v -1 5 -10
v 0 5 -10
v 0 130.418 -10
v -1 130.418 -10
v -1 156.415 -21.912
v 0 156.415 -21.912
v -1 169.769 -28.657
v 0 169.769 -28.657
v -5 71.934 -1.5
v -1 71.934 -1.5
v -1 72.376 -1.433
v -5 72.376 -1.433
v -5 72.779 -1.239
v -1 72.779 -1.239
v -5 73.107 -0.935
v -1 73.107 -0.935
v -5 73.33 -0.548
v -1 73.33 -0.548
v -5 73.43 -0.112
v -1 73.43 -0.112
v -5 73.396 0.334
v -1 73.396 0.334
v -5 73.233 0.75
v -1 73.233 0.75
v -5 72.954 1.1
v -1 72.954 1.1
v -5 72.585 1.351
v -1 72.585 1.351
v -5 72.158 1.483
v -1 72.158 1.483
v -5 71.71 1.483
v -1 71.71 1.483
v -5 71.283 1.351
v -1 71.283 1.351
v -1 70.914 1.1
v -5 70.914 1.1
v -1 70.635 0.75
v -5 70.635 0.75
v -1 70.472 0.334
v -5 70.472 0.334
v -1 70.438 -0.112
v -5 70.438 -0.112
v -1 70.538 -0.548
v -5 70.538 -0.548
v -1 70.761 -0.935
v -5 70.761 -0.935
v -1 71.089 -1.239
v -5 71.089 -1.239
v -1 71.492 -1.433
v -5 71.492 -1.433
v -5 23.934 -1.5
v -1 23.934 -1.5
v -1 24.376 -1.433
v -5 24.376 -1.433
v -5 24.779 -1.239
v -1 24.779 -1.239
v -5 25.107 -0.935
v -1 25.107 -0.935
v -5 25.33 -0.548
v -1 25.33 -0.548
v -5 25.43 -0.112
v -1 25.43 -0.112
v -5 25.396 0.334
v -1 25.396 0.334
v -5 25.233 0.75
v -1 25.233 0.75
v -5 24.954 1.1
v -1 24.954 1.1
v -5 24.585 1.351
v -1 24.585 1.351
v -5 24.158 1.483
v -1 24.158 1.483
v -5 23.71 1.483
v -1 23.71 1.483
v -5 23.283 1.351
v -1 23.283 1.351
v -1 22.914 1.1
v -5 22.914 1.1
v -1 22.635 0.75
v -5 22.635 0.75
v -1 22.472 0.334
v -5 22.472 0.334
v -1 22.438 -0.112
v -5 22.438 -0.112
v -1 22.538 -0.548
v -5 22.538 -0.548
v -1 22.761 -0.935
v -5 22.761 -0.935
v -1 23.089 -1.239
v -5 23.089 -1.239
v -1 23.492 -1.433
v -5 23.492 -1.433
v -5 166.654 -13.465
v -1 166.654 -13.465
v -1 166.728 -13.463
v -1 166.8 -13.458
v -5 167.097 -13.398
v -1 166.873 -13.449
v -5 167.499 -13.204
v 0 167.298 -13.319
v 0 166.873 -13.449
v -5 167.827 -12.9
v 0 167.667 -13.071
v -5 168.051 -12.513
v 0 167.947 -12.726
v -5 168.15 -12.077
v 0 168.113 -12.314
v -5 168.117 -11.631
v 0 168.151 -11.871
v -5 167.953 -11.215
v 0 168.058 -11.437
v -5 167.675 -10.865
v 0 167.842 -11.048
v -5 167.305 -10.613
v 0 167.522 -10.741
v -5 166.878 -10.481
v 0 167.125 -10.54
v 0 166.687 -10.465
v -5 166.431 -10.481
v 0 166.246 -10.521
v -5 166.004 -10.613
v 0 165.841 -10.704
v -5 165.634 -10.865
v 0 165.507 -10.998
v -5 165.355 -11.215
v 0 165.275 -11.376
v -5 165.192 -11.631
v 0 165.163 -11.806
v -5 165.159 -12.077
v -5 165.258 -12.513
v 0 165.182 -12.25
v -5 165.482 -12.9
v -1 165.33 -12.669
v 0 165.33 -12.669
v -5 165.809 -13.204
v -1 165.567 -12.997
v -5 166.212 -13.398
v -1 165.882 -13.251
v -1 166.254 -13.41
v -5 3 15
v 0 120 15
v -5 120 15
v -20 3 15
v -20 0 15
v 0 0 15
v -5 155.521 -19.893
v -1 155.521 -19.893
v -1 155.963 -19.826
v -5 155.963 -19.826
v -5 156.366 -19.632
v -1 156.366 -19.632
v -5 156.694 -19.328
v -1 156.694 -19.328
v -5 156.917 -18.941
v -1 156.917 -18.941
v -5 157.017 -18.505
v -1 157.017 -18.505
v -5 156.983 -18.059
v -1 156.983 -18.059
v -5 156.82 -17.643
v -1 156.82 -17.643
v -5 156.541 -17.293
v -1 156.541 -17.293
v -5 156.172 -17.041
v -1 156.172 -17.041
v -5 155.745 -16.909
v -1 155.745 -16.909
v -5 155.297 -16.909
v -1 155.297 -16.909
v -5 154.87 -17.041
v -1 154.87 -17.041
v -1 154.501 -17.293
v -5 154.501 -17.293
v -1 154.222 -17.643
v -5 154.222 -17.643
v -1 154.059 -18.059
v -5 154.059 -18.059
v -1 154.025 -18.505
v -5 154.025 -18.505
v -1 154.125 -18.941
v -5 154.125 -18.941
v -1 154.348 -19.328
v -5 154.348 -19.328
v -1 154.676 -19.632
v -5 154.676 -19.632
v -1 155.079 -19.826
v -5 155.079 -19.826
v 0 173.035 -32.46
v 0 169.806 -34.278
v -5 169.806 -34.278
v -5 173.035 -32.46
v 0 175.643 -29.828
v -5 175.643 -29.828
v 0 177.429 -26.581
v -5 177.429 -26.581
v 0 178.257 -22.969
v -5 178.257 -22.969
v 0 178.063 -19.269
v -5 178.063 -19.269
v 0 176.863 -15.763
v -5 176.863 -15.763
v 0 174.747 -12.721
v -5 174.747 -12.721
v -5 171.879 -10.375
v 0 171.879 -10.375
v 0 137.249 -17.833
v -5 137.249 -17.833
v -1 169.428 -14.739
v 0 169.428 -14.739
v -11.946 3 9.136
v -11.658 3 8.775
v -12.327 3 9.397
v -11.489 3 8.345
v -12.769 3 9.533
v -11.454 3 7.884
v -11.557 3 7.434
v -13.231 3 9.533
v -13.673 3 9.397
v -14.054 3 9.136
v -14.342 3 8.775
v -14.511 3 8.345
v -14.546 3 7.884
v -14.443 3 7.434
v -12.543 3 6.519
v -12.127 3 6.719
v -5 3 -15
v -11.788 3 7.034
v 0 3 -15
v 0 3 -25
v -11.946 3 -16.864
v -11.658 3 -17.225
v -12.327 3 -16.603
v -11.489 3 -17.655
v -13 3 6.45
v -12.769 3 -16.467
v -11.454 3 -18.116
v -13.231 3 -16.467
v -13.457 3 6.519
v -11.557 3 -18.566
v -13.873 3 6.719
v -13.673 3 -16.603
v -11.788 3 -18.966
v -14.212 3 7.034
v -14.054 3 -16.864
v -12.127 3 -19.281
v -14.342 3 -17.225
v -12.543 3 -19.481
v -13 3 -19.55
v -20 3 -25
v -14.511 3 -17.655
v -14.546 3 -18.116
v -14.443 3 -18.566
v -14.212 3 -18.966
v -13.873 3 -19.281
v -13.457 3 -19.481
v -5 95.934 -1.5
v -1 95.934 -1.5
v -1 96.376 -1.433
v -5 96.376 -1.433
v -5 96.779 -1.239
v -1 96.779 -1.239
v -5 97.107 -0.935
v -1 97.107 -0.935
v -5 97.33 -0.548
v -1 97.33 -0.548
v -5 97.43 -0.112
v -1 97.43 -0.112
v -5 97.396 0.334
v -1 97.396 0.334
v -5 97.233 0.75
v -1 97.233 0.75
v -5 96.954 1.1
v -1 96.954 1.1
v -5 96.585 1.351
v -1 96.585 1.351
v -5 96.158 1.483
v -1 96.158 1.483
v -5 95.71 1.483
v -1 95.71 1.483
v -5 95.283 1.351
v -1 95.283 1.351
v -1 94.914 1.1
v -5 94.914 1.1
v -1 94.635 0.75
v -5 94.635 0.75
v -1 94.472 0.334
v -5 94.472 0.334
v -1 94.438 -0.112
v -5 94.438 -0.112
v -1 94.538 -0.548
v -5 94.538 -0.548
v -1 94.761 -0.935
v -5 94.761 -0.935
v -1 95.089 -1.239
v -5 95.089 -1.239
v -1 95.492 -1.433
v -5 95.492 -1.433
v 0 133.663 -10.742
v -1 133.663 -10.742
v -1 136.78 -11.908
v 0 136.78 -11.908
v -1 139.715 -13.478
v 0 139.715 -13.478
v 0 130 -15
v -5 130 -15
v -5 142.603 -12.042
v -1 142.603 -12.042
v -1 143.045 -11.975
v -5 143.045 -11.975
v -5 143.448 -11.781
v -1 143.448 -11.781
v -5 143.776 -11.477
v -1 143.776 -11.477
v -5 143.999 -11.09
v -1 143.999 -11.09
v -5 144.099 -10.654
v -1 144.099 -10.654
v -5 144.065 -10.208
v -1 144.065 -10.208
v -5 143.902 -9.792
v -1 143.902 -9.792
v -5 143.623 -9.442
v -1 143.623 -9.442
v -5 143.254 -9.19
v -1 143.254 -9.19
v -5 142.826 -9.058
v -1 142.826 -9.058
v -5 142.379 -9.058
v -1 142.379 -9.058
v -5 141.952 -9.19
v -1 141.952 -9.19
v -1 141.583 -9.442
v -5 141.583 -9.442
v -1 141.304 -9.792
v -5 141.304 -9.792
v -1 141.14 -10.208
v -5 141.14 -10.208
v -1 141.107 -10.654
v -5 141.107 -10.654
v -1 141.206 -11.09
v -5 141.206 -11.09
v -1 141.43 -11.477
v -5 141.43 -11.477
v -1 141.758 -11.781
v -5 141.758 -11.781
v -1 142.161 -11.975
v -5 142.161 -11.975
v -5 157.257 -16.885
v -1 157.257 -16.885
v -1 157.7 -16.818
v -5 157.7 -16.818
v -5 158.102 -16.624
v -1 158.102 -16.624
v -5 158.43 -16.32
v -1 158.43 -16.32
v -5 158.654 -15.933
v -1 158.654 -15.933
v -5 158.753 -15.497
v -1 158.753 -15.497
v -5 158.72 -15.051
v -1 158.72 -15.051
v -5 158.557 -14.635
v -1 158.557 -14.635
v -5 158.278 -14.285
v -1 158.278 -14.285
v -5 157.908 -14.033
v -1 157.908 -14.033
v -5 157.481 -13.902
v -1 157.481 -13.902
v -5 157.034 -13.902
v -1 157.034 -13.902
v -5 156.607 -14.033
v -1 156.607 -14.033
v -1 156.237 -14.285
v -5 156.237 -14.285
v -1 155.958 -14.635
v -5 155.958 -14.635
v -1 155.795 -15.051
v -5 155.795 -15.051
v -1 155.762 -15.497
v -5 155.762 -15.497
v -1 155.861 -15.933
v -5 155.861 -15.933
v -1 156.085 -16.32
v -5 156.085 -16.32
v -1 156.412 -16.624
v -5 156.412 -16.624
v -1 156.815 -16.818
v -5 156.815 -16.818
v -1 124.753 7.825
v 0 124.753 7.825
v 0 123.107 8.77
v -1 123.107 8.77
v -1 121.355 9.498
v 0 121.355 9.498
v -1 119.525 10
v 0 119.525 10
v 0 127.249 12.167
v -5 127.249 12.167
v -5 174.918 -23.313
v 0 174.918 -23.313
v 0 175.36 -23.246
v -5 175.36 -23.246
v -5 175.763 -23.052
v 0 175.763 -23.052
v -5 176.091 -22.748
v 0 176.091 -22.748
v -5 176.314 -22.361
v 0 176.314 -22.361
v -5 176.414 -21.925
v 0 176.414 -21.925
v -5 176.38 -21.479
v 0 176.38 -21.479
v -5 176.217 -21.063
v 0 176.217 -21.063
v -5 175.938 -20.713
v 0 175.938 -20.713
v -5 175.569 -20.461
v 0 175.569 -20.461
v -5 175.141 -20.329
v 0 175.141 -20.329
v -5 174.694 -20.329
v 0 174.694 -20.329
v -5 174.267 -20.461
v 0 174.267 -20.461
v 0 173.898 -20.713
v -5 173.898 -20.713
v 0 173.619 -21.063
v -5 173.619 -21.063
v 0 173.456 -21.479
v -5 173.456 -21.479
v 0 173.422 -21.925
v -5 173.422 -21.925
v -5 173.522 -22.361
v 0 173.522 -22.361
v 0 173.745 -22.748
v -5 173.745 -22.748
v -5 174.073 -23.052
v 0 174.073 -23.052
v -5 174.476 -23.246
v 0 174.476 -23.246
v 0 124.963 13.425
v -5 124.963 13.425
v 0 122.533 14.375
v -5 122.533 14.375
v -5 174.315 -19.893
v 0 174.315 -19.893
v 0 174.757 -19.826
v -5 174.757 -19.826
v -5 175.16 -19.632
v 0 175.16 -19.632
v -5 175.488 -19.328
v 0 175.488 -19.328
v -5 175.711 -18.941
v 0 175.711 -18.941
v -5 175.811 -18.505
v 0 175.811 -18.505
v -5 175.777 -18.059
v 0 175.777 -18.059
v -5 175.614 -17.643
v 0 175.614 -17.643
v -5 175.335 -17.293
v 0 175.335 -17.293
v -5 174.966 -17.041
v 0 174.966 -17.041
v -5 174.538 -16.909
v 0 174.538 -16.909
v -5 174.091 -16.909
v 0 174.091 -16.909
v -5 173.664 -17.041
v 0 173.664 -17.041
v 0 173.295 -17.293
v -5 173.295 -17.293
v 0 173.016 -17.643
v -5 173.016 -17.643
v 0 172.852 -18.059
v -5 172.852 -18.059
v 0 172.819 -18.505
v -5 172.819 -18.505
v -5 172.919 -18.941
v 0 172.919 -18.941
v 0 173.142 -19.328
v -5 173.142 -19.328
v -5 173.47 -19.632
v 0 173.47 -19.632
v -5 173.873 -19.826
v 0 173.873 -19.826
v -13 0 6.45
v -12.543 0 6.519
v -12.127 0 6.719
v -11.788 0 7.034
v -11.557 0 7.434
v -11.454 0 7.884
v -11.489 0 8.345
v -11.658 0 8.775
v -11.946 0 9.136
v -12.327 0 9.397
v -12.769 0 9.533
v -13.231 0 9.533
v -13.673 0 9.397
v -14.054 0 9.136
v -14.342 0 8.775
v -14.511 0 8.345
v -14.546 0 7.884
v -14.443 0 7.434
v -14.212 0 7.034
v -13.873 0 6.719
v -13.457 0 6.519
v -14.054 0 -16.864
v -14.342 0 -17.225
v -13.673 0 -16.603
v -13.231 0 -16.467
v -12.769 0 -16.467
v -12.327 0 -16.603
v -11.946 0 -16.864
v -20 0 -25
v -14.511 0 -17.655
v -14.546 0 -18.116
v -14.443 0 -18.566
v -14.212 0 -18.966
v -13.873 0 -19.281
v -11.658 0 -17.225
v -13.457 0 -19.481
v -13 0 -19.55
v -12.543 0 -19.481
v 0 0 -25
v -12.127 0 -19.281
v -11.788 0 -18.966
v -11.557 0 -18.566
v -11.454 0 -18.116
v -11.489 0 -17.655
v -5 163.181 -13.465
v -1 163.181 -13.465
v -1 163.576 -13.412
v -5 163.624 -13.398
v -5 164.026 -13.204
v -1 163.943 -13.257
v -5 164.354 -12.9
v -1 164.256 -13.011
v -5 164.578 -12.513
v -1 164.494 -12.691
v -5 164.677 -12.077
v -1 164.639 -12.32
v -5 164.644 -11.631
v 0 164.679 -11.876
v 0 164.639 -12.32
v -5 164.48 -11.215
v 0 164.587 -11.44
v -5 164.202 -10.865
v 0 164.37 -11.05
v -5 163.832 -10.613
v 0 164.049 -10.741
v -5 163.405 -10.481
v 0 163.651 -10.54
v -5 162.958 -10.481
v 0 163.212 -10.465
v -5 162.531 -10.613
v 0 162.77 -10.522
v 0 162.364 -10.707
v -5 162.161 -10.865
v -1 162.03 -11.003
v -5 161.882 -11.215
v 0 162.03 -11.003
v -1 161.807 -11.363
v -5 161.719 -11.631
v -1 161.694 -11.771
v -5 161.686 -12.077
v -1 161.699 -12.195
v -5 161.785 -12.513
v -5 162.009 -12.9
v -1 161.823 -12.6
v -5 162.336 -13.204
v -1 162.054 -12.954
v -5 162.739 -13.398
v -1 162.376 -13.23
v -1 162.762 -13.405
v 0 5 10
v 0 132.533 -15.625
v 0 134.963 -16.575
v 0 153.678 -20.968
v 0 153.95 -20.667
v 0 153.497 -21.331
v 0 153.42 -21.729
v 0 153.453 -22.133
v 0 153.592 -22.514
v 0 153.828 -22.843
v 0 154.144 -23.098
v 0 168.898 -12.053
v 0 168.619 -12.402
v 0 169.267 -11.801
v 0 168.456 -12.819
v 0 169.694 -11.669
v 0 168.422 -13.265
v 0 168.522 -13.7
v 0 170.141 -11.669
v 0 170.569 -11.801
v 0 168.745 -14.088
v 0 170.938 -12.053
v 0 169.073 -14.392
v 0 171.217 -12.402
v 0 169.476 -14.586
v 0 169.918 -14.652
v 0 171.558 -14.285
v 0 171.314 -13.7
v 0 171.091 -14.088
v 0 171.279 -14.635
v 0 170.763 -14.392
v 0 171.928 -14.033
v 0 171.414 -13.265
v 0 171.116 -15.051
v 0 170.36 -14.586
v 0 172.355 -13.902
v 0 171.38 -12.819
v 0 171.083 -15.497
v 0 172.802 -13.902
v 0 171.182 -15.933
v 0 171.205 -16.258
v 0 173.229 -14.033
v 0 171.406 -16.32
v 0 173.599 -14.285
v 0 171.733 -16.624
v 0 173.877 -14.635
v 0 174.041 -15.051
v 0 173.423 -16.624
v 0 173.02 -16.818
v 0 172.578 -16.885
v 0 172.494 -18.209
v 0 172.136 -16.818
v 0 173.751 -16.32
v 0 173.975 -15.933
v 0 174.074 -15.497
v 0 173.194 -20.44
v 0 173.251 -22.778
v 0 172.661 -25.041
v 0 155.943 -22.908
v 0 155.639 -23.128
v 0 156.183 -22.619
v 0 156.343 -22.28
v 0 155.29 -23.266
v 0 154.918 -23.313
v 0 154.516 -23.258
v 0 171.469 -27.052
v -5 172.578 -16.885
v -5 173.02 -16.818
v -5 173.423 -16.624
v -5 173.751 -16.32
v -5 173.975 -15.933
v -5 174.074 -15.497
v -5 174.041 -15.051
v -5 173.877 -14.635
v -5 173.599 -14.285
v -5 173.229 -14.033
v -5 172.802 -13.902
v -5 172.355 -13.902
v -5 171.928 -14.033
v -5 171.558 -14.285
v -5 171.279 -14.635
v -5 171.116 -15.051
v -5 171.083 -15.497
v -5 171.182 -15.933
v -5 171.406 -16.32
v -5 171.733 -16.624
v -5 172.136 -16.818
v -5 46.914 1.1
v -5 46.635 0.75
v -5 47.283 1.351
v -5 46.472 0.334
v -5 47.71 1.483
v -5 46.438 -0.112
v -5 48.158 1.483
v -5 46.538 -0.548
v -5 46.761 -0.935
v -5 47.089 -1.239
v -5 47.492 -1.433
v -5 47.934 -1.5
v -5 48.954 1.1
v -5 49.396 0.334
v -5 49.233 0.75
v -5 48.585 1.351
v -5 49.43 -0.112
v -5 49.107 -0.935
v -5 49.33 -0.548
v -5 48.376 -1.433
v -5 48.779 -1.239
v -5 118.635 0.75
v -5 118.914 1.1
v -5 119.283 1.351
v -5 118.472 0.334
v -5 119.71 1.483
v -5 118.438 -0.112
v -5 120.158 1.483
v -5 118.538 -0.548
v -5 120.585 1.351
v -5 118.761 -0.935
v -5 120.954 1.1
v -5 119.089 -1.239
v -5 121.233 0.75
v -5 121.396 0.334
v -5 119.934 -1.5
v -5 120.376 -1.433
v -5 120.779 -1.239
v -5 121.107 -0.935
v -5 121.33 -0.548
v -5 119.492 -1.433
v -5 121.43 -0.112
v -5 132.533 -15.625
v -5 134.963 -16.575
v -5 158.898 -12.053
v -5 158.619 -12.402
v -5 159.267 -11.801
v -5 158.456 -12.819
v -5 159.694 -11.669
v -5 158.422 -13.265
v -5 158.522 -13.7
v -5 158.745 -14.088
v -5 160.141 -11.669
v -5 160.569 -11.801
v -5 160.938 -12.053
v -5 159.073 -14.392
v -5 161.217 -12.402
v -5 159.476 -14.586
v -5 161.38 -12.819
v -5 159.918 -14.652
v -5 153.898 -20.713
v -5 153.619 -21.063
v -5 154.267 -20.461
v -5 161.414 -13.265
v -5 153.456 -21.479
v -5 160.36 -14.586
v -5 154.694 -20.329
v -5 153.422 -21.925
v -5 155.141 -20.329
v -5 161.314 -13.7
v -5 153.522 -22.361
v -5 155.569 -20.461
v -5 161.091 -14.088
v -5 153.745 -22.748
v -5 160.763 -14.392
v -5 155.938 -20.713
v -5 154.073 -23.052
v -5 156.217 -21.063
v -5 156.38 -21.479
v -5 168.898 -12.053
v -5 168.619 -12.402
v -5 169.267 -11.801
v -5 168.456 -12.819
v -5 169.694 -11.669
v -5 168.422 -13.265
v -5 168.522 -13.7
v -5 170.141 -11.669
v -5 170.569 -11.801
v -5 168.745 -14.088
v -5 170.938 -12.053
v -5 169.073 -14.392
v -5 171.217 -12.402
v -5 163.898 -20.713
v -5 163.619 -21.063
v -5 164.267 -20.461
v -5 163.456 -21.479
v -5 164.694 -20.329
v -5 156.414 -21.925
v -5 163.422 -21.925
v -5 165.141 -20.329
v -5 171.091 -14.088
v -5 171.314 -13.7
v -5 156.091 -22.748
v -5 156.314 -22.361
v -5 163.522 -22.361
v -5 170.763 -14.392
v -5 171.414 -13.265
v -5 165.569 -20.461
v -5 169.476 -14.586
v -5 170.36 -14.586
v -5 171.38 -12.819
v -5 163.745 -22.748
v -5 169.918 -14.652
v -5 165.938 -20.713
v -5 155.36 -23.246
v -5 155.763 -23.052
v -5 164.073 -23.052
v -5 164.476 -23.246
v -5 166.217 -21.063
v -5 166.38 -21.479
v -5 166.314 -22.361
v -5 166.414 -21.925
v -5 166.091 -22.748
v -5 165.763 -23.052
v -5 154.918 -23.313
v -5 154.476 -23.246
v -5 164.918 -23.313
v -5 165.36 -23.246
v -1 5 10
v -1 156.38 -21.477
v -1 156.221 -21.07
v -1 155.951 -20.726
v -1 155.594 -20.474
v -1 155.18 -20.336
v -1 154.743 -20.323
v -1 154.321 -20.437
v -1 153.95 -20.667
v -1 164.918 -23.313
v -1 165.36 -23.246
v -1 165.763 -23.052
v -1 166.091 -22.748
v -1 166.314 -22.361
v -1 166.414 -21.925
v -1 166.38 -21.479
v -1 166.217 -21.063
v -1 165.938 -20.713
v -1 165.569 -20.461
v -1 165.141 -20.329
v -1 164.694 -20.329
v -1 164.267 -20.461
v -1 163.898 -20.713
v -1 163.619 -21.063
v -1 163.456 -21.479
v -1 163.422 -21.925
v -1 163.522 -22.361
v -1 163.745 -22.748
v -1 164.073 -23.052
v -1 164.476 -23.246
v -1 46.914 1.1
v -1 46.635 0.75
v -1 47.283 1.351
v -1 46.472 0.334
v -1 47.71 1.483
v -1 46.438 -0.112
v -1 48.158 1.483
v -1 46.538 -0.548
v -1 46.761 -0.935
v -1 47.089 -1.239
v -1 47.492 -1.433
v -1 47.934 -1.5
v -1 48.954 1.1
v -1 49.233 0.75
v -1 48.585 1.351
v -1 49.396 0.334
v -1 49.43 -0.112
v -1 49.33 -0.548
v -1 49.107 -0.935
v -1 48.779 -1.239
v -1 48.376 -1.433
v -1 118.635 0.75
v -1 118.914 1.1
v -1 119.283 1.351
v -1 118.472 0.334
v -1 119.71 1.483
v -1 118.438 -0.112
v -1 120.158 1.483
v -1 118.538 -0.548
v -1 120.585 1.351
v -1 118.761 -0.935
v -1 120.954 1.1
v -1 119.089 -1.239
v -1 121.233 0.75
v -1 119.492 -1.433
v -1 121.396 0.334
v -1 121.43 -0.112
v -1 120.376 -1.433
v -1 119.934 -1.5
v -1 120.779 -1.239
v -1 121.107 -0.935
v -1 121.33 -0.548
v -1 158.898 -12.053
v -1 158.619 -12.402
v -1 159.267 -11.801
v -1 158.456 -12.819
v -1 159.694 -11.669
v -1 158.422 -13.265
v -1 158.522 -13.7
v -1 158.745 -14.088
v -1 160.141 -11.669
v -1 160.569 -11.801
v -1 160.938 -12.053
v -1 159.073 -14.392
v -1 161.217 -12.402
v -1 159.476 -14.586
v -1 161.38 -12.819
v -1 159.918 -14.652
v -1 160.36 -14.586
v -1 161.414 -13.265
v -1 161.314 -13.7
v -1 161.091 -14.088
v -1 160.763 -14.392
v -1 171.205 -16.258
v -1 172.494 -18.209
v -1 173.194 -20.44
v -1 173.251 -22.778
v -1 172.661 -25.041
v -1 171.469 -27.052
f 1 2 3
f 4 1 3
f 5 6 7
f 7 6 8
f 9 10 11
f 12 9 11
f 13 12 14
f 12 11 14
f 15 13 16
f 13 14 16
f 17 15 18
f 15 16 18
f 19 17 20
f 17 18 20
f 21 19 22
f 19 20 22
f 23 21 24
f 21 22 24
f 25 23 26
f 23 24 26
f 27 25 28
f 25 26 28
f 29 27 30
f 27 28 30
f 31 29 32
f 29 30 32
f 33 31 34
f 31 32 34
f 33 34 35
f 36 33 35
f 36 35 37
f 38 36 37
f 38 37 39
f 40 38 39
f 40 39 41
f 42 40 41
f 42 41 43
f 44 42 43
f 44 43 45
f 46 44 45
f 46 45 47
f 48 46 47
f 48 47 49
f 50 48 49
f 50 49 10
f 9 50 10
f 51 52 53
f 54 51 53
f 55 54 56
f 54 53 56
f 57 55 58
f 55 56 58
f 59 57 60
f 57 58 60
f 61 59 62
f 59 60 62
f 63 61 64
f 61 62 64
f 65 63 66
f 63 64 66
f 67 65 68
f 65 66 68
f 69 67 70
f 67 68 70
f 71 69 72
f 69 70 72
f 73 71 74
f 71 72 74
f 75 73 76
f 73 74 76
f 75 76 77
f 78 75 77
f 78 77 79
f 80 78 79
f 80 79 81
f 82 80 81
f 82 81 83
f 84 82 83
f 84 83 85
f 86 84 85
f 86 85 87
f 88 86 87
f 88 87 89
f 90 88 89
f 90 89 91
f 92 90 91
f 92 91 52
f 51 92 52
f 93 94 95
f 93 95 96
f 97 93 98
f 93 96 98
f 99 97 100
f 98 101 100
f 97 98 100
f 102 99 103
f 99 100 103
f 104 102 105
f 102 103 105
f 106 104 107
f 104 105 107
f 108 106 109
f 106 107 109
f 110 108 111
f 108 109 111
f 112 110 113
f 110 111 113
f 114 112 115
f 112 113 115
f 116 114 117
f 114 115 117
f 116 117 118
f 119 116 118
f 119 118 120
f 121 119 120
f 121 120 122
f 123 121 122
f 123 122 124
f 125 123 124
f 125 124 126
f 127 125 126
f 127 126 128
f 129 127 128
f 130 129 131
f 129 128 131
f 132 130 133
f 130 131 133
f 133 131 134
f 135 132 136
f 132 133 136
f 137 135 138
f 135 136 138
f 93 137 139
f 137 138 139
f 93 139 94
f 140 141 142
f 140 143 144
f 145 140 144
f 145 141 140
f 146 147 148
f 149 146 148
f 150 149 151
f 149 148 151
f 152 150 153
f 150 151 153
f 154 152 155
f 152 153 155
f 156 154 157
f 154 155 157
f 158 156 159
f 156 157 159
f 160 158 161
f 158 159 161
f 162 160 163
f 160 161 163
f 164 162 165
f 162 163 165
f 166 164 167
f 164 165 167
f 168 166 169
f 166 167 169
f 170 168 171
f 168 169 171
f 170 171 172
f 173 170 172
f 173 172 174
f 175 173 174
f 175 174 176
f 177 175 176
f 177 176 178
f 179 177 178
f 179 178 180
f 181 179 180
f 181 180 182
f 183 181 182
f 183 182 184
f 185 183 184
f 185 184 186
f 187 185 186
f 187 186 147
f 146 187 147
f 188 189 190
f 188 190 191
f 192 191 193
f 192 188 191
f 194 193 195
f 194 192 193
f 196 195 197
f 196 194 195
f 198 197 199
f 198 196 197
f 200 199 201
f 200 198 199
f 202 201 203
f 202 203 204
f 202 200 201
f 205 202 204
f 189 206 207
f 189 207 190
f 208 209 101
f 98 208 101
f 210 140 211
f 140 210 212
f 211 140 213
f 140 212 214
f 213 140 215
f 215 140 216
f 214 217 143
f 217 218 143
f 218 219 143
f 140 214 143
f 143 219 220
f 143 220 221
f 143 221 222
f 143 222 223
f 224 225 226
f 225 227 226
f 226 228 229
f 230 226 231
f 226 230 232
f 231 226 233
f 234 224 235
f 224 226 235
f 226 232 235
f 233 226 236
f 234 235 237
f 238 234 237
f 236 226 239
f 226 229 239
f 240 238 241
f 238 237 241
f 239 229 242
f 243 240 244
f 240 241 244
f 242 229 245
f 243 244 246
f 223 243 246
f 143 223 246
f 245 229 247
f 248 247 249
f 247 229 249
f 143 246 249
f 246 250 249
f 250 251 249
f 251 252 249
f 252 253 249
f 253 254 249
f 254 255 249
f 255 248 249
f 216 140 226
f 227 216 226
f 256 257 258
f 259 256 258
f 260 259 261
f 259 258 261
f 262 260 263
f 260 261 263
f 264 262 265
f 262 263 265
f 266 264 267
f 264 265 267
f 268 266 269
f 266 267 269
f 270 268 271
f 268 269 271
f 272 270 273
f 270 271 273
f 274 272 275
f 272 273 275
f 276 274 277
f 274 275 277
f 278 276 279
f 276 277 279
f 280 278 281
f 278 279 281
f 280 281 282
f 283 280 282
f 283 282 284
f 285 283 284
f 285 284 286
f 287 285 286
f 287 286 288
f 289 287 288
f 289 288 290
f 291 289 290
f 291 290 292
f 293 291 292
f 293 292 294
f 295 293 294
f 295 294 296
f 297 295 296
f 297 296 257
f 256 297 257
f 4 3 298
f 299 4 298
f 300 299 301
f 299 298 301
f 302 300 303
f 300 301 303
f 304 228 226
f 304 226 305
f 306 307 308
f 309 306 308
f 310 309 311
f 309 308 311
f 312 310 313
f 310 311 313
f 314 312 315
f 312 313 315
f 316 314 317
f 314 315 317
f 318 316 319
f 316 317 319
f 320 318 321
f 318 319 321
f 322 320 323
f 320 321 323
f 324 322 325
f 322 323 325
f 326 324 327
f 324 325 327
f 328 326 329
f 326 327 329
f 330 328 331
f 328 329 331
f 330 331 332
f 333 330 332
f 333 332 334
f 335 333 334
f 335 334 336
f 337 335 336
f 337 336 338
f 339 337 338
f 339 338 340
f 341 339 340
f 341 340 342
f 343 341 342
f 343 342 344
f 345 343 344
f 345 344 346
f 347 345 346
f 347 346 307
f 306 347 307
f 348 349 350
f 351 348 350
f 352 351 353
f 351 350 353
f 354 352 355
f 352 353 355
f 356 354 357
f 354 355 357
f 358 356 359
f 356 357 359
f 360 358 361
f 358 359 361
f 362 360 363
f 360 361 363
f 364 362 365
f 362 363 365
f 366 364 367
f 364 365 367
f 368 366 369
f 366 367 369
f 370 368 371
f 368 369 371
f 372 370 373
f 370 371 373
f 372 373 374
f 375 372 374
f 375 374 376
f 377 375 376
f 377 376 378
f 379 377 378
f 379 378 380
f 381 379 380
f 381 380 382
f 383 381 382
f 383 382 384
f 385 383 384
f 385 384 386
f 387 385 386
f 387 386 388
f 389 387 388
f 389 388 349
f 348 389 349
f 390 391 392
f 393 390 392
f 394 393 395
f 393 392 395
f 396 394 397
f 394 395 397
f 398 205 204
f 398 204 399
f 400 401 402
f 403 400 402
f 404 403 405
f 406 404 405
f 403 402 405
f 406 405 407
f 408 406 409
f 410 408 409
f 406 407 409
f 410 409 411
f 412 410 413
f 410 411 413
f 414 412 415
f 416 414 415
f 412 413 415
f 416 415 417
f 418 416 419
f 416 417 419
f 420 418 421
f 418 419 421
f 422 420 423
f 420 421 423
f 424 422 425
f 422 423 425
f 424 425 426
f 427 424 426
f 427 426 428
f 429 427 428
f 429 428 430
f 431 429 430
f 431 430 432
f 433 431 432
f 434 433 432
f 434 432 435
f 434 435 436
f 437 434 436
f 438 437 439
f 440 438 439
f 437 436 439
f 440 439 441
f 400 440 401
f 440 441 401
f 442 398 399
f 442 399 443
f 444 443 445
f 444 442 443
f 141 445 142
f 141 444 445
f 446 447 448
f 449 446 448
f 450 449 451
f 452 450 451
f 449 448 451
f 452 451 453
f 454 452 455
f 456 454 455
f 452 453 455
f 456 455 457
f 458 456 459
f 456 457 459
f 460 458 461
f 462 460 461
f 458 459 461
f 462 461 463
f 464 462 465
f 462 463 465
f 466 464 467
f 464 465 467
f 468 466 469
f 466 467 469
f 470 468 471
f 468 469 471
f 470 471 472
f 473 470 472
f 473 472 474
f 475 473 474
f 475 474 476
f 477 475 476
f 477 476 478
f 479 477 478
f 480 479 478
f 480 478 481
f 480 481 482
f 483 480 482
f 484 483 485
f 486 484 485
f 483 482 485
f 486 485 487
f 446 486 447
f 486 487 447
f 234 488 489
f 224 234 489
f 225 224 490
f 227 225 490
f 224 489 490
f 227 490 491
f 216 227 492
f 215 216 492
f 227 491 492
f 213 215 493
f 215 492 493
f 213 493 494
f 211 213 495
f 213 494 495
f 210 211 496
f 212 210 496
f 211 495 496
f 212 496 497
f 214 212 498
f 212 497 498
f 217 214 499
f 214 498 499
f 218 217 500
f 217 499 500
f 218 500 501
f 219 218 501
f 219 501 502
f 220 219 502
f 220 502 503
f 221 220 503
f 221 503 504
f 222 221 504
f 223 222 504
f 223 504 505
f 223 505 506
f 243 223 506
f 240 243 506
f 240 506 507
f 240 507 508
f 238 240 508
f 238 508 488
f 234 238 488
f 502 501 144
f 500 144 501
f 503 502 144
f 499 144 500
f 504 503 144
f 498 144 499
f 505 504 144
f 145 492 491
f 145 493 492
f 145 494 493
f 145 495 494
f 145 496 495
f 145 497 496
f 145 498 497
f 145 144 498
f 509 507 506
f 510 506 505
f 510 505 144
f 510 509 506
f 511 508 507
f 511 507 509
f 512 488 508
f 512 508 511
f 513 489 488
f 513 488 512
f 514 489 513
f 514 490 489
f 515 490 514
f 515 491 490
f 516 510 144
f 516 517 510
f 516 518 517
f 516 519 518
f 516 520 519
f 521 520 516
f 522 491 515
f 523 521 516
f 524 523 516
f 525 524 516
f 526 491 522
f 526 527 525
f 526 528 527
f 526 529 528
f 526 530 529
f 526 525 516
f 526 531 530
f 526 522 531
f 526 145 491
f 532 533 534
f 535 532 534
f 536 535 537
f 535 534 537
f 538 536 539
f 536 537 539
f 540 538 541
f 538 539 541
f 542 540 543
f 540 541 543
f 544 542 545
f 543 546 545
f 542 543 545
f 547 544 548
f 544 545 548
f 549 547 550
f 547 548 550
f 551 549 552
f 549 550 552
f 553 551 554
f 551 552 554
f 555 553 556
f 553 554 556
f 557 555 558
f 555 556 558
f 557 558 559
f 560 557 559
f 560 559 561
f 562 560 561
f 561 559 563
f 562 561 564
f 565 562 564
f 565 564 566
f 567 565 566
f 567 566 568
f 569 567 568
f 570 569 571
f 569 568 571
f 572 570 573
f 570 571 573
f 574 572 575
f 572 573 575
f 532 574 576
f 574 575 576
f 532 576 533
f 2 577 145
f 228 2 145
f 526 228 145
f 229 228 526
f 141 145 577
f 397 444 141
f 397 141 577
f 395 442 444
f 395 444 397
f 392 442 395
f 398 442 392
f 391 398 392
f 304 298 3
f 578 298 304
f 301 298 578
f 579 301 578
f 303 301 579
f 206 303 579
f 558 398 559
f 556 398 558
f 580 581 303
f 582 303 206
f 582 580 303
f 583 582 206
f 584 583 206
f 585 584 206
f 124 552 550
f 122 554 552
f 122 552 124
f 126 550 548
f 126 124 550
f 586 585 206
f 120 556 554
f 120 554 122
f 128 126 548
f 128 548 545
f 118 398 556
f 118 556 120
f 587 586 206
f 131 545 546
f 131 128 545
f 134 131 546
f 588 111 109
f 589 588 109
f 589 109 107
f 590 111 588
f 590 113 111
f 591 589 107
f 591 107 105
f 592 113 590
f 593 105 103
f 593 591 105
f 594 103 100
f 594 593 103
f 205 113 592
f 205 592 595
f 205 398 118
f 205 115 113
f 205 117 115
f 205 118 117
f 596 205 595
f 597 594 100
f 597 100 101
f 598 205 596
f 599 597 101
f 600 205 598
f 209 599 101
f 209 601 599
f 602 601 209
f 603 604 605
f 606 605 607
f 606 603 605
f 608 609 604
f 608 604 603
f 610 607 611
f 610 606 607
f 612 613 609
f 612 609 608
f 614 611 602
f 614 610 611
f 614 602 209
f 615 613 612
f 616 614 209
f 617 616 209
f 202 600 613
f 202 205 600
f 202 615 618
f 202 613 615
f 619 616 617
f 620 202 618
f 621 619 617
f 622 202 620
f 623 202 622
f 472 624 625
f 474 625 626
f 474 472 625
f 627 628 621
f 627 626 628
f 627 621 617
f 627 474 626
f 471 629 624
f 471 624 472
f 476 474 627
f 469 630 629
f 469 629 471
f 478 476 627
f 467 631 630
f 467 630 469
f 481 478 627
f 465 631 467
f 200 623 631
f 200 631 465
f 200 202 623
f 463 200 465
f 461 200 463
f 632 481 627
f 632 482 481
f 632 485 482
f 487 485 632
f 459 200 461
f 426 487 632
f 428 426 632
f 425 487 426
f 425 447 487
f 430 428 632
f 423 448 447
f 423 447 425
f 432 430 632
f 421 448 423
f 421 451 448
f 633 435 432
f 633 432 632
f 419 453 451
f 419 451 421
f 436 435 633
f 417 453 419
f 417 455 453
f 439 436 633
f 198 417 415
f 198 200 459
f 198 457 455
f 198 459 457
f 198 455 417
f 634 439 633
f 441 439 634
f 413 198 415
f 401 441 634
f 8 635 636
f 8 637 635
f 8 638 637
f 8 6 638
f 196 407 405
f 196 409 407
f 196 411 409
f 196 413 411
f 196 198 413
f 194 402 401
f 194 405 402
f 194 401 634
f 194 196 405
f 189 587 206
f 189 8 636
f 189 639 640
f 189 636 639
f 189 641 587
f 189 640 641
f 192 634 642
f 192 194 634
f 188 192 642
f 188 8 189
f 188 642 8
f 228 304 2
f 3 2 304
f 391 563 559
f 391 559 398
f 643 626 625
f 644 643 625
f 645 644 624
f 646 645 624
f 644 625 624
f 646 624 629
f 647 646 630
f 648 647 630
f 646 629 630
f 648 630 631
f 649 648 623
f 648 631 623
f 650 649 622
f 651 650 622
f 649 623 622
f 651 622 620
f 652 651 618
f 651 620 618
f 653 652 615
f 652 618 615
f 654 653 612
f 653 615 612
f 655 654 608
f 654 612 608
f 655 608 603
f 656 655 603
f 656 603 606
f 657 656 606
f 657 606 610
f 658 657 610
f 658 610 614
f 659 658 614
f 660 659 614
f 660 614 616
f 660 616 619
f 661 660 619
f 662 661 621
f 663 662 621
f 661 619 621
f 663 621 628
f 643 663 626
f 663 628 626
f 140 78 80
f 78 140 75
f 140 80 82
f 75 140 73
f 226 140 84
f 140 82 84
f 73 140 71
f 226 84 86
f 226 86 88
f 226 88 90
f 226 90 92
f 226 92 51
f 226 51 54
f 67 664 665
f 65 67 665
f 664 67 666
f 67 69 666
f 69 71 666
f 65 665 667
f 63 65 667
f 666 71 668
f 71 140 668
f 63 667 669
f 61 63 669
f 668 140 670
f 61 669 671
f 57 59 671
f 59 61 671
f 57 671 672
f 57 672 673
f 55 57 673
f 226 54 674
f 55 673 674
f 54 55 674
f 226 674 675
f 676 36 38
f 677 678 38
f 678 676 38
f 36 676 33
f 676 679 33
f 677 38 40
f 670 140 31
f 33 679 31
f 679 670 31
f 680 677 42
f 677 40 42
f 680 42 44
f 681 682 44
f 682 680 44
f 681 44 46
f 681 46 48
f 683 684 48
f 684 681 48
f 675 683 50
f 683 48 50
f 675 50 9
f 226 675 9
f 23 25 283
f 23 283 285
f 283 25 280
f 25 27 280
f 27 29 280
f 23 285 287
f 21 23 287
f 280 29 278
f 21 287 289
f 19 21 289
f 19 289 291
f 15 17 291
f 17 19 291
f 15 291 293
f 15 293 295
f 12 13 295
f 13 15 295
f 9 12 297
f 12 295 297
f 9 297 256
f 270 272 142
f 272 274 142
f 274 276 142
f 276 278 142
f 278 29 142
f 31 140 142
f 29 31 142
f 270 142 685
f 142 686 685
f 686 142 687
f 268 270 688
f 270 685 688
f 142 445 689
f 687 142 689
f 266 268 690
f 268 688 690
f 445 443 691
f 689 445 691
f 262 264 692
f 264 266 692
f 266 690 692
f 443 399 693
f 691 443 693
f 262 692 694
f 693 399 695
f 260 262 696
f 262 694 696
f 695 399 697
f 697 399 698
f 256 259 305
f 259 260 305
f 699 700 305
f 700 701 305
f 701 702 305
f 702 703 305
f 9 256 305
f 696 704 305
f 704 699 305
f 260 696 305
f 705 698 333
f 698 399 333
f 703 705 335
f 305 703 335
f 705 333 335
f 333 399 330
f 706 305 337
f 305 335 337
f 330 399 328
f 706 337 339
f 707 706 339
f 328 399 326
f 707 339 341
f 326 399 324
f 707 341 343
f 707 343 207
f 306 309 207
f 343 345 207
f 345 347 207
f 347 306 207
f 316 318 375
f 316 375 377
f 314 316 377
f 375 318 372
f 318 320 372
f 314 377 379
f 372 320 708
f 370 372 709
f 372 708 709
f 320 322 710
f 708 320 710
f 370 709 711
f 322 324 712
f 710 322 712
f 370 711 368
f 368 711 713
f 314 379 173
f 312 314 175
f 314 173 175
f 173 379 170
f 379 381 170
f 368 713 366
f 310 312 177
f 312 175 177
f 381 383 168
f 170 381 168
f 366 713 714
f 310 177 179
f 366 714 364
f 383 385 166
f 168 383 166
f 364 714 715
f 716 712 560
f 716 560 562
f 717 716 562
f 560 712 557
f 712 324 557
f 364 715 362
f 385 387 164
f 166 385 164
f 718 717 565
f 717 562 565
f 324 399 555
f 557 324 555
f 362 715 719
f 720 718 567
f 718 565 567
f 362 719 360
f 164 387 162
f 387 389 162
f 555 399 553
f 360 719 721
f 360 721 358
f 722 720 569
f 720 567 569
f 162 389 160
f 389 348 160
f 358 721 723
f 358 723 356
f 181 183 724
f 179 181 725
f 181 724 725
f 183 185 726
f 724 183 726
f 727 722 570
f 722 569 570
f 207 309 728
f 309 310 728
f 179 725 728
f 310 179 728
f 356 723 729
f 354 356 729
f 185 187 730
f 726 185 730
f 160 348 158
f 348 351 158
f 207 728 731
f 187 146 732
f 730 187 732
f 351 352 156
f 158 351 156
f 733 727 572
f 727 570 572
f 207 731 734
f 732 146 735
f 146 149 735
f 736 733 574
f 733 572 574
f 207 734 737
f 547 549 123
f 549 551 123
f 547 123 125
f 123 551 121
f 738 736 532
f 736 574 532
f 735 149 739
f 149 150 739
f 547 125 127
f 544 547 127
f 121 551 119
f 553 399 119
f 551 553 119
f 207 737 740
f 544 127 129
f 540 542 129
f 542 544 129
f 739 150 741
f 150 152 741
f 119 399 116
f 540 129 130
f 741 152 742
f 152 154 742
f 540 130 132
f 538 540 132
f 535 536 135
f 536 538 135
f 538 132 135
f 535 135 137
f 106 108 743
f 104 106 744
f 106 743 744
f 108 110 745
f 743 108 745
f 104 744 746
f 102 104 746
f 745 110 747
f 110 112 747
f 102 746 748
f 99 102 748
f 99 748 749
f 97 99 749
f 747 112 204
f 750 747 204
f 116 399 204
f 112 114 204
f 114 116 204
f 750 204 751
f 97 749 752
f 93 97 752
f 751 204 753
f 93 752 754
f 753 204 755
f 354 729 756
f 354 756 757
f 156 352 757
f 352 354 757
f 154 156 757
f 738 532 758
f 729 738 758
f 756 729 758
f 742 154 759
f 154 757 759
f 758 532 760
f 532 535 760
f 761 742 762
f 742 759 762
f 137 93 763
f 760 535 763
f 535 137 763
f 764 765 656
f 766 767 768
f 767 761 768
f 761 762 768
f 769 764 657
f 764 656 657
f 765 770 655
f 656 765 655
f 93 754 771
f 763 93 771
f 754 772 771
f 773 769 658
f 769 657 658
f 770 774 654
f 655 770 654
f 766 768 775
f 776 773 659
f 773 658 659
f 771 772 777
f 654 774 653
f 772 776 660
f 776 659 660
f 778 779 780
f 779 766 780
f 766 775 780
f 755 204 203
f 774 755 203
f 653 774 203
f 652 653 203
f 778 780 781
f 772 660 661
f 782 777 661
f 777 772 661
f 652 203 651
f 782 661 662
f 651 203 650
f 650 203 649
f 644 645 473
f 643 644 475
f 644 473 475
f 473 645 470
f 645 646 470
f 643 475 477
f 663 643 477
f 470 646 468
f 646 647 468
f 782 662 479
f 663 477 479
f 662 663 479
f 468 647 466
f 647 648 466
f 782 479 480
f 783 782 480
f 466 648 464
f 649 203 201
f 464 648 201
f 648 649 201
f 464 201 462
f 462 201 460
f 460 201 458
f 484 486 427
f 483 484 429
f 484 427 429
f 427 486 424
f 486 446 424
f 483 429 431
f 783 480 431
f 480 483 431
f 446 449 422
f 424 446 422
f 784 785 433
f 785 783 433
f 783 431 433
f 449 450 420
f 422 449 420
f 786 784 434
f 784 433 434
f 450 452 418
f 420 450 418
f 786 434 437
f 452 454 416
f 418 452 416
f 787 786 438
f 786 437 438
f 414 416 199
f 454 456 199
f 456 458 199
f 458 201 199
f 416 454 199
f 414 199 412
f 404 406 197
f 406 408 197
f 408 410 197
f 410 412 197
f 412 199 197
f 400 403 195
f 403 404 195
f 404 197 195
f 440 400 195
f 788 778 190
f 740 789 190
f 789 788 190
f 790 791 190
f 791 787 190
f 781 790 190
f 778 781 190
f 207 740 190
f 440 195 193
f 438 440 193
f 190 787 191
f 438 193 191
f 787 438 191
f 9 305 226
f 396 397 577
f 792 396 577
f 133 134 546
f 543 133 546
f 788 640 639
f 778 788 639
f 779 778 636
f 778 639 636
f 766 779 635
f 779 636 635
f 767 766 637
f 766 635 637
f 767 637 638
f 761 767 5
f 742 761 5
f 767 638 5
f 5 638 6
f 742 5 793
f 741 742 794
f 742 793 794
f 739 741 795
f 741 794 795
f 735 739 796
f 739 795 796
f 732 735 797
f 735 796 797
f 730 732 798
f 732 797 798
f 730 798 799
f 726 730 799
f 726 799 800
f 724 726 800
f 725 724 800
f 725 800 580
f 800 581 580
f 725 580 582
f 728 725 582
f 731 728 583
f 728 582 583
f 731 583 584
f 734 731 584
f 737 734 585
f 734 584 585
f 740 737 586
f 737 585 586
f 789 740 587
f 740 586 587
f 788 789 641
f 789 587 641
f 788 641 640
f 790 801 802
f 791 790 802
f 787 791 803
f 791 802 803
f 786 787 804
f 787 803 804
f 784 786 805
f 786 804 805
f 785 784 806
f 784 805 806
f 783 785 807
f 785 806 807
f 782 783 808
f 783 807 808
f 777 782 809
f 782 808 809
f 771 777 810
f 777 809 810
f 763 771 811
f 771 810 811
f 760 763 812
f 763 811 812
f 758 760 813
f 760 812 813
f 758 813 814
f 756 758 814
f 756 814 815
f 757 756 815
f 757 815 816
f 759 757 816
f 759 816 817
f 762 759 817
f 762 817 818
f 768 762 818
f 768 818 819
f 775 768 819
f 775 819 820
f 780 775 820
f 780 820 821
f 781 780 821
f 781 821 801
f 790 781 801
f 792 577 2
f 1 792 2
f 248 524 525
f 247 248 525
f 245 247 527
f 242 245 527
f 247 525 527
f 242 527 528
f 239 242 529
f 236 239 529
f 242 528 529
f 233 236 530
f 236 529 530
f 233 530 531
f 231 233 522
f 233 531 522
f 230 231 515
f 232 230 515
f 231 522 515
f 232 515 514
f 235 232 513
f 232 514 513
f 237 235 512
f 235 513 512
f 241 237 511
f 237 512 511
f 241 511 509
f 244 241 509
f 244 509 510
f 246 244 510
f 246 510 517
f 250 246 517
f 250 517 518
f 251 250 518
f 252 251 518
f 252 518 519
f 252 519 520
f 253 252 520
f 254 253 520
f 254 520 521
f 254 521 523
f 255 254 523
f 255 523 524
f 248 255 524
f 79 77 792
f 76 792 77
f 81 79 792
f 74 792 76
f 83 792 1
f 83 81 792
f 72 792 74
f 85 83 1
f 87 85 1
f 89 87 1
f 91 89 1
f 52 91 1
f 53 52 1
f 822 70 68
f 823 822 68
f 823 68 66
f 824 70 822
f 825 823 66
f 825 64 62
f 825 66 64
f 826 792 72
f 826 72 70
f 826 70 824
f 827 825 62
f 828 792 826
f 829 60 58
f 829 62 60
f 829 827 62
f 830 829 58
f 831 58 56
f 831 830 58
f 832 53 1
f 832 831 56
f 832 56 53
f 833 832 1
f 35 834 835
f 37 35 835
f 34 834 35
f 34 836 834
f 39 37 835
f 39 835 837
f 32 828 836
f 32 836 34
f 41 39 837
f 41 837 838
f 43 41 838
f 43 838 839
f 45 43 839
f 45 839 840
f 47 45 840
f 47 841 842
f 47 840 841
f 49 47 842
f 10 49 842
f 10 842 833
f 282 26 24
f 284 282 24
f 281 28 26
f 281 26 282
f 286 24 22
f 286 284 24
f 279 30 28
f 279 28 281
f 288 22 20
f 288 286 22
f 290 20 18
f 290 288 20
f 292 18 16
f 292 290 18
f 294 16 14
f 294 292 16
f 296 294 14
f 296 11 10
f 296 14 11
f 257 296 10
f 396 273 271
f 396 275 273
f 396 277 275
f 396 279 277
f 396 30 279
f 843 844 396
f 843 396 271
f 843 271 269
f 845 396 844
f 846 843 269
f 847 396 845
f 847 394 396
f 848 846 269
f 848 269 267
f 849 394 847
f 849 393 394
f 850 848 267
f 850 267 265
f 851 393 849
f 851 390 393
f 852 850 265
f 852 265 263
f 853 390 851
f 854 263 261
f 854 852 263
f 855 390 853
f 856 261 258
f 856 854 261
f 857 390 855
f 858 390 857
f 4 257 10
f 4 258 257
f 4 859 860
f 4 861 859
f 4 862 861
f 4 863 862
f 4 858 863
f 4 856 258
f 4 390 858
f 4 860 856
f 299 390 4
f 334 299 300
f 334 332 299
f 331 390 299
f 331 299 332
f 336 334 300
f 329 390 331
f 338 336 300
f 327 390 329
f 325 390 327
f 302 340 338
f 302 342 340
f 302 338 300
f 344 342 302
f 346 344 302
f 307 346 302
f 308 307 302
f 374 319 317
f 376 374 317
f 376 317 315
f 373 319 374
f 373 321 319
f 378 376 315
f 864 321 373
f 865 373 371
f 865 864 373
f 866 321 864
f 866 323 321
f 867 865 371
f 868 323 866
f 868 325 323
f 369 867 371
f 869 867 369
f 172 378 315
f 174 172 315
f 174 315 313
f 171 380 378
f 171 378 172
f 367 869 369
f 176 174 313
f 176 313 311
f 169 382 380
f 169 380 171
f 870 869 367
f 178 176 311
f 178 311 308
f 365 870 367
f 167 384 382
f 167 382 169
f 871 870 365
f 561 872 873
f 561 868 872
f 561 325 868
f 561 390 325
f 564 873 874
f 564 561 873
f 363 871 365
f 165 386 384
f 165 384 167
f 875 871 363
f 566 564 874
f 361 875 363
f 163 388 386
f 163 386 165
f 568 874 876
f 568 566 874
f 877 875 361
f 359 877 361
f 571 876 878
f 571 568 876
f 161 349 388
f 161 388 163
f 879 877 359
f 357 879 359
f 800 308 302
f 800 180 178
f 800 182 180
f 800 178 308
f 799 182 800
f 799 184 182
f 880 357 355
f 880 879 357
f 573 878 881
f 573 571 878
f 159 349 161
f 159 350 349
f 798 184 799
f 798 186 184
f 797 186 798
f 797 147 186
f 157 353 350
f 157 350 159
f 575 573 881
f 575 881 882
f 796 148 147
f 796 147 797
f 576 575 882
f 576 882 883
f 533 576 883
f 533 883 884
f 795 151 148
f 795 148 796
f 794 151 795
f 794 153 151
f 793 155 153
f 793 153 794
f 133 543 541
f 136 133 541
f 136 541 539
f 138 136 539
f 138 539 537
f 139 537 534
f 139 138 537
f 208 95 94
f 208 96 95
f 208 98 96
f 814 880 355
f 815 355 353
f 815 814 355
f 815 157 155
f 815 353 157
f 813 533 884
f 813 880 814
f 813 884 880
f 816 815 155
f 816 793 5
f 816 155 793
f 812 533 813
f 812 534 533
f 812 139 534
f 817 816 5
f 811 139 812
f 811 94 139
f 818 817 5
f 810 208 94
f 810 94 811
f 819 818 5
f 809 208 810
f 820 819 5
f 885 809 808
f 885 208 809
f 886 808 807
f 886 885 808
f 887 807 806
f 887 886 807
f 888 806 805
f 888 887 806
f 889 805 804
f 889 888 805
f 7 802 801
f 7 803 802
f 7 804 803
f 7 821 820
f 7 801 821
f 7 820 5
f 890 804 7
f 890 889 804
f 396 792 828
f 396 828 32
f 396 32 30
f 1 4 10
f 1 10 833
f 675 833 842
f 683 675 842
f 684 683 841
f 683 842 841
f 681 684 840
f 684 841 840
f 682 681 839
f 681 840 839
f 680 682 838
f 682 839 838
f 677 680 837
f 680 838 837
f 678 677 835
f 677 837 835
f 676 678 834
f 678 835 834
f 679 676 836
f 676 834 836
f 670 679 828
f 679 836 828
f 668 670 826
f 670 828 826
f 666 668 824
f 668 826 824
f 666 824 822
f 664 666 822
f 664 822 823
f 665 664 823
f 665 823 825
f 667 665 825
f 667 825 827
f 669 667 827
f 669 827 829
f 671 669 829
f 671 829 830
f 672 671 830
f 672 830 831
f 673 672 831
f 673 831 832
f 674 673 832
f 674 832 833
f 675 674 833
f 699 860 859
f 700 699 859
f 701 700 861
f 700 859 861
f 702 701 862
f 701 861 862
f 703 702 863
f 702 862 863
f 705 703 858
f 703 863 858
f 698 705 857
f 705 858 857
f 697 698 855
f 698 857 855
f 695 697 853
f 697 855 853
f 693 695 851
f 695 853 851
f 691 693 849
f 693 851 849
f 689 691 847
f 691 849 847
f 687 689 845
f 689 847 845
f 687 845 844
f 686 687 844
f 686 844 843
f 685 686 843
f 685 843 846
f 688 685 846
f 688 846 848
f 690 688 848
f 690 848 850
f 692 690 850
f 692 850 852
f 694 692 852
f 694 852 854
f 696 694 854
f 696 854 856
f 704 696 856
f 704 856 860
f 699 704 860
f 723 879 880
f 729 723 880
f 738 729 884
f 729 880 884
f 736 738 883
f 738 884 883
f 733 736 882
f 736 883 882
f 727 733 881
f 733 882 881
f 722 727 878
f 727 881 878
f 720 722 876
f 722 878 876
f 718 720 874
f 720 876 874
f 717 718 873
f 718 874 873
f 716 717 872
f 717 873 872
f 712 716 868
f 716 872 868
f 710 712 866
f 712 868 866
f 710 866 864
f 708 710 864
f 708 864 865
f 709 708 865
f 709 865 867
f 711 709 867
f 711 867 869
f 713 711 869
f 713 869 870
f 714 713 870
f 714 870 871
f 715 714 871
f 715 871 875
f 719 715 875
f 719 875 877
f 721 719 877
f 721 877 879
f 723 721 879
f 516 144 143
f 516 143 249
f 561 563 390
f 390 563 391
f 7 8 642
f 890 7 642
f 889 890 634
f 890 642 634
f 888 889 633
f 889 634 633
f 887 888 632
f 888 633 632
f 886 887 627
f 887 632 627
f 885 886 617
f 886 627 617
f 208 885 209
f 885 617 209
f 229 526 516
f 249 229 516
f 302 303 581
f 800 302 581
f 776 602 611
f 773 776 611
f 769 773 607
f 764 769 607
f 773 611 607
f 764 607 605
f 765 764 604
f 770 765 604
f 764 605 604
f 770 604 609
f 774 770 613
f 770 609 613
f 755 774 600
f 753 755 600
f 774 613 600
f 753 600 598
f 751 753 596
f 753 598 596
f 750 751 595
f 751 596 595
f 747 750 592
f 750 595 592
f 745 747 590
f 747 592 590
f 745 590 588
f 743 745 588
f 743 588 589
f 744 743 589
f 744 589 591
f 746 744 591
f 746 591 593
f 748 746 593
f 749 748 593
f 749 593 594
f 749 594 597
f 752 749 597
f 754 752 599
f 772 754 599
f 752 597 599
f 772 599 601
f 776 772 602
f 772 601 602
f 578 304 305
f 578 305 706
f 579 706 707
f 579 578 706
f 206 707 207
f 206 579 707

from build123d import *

# Parameters (mm, degrees)
SKETCH_1_R          = 1.5
EXTRUDE_2_DEPTH     = 5
CUT_EXTRUDE_1_DEPTH = 1
SKETCH_5_W          = 20
SKETCH_5_H          = 40
EXTRUDE_3_DEPTH     = 3
SKETCH_6_R          = 1.55
CUT_EXTRUDE_2_DEPTH = 10


with BuildPart() as part:
    # 草图1 → 凸台-拉伸2 (new body)
    with BuildSketch(Plane(origin=(0, 0, 0), x_dir=(0, 0, -1), z_dir=(1, 0, 0))):
        with BuildLine():
            Line((-15, 0), (15, 0))
            Line((15, 0), (15, 130))
            ThreePointArc((15, 130), (16.060667235, 133.763397528), (17.833287426, 137.248507798))
            Line((17.833287426, 137.248507798), (34.277601095, 169.80605943))
            ThreePointArc((34.277601095, 169.80605943), (22.969406924, 178.256928012), (10.37531975, 171.878730504))
            Line((10.37531975, 171.878730504), (-12.166712574, 127.248507798))
            ThreePointArc((-12.166712574, 127.248507798), (-13.939332765, 123.763397528), (-15, 120))
            Line((-15, 120), (-15, 0))
        make_face()
        with Locations((0, 23.934052351)):
            Circle(SKETCH_1_R, mode=Mode.SUBTRACT)
        with Locations((0, 47.934052351)):
            Circle(SKETCH_1_R, mode=Mode.SUBTRACT)
        with Locations((0, 71.934052351)):
            Circle(SKETCH_1_R, mode=Mode.SUBTRACT)
        with Locations((0, 95.934052351)):
            Circle(SKETCH_1_R, mode=Mode.SUBTRACT)
        with Locations((10.541707006, 142.602806473)):
            Circle(SKETCH_1_R, mode=Mode.SUBTRACT)
        with Locations((0, 119.934052351)):
            Circle(SKETCH_1_R, mode=Mode.SUBTRACT)
        with Locations((21.812723168, 164.917917825)):
            Circle(SKETCH_1_R, mode=Mode.SUBTRACT)
        with Locations((11.964645637, 166.654399602)):
            Circle(SKETCH_1_R, mode=Mode.SUBTRACT)
        with Locations((11.964645637, 163.181436049)):
            Circle(SKETCH_1_R, mode=Mode.SUBTRACT)
        with Locations((13.15246913, 159.917917825)):
            Circle(SKETCH_1_R, mode=Mode.SUBTRACT)
        with Locations((15.384847071, 157.257473394)):
            Circle(SKETCH_1_R, mode=Mode.SUBTRACT)
        with Locations((18.392521734, 155.520991617)):
            Circle(SKETCH_1_R, mode=Mode.SUBTRACT)
        with Locations((21.812723168, 154.917917825)):
            Circle(SKETCH_1_R, mode=Mode.SUBTRACT)
        with Locations((13.15246913, 169.917917825)):
            Circle(SKETCH_1_R, mode=Mode.SUBTRACT)
        with Locations((15.384847071, 172.578362256)):
            Circle(SKETCH_1_R, mode=Mode.SUBTRACT)
        with Locations((18.392521734, 174.314844033)):
            Circle(SKETCH_1_R, mode=Mode.SUBTRACT)
        with Locations((21.812723168, 174.917917825)):
            Circle(SKETCH_1_R, mode=Mode.SUBTRACT)
    extrude(amount=-EXTRUDE_2_DEPTH)

    # 草图4 → 切除-拉伸1 (cut)
    with BuildSketch(Plane(origin=(0, 0, 0), x_dir=(0, 0, -1), z_dir=(1, 0, 0))):
        with BuildLine():
            Line((-10, 5), (10, 5))
            Line((10, 5), (10, 130.418298195))
            ThreePointArc((10, 130.418298195), (11.272736422, 135.241025308), (13.477541954, 139.715104809))
            Line((13.477541954, 139.715104809), (28.657153069, 169.768713769))
            ThreePointArc((28.657153069, 169.768713769), (21.607154469, 173.304465594), (14.73885303, 169.427552317))
            Line((14.73885303, 169.427552317), (-7.82549521, 124.753147068))
            ThreePointArc((-7.82549521, 124.753147068), (-9.161705076, 122.242477333), (-10, 119.524724411))
            Line((-10, 119.524724411), (-10, 5))
        make_face()
    extrude(amount=-CUT_EXTRUDE_1_DEPTH, mode=Mode.SUBTRACT)

    # 草图5 → 凸台-拉伸3 (add)
    with BuildSketch(Plane(origin=(0, 0, 0), x_dir=(-1, 0, 0), z_dir=(0, -1, 0))):
        with Locations((10, 5)):
            Rectangle(SKETCH_5_W, SKETCH_5_H)
    extrude(amount=-EXTRUDE_3_DEPTH)

    # 草图6 → 切除-拉伸2 (cut)
    with BuildSketch(Plane.XZ):
        with Locations(Location((-13, -18, 0), (0, 0, 270))):
            Circle(SKETCH_6_R)
        with Locations(Location((-13, 8, 0), (0, 0, 270))):
            Circle(SKETCH_6_R)
    extrude(amount=-CUT_EXTRUDE_2_DEPTH, mode=Mode.SUBTRACT)


solid = part.part
